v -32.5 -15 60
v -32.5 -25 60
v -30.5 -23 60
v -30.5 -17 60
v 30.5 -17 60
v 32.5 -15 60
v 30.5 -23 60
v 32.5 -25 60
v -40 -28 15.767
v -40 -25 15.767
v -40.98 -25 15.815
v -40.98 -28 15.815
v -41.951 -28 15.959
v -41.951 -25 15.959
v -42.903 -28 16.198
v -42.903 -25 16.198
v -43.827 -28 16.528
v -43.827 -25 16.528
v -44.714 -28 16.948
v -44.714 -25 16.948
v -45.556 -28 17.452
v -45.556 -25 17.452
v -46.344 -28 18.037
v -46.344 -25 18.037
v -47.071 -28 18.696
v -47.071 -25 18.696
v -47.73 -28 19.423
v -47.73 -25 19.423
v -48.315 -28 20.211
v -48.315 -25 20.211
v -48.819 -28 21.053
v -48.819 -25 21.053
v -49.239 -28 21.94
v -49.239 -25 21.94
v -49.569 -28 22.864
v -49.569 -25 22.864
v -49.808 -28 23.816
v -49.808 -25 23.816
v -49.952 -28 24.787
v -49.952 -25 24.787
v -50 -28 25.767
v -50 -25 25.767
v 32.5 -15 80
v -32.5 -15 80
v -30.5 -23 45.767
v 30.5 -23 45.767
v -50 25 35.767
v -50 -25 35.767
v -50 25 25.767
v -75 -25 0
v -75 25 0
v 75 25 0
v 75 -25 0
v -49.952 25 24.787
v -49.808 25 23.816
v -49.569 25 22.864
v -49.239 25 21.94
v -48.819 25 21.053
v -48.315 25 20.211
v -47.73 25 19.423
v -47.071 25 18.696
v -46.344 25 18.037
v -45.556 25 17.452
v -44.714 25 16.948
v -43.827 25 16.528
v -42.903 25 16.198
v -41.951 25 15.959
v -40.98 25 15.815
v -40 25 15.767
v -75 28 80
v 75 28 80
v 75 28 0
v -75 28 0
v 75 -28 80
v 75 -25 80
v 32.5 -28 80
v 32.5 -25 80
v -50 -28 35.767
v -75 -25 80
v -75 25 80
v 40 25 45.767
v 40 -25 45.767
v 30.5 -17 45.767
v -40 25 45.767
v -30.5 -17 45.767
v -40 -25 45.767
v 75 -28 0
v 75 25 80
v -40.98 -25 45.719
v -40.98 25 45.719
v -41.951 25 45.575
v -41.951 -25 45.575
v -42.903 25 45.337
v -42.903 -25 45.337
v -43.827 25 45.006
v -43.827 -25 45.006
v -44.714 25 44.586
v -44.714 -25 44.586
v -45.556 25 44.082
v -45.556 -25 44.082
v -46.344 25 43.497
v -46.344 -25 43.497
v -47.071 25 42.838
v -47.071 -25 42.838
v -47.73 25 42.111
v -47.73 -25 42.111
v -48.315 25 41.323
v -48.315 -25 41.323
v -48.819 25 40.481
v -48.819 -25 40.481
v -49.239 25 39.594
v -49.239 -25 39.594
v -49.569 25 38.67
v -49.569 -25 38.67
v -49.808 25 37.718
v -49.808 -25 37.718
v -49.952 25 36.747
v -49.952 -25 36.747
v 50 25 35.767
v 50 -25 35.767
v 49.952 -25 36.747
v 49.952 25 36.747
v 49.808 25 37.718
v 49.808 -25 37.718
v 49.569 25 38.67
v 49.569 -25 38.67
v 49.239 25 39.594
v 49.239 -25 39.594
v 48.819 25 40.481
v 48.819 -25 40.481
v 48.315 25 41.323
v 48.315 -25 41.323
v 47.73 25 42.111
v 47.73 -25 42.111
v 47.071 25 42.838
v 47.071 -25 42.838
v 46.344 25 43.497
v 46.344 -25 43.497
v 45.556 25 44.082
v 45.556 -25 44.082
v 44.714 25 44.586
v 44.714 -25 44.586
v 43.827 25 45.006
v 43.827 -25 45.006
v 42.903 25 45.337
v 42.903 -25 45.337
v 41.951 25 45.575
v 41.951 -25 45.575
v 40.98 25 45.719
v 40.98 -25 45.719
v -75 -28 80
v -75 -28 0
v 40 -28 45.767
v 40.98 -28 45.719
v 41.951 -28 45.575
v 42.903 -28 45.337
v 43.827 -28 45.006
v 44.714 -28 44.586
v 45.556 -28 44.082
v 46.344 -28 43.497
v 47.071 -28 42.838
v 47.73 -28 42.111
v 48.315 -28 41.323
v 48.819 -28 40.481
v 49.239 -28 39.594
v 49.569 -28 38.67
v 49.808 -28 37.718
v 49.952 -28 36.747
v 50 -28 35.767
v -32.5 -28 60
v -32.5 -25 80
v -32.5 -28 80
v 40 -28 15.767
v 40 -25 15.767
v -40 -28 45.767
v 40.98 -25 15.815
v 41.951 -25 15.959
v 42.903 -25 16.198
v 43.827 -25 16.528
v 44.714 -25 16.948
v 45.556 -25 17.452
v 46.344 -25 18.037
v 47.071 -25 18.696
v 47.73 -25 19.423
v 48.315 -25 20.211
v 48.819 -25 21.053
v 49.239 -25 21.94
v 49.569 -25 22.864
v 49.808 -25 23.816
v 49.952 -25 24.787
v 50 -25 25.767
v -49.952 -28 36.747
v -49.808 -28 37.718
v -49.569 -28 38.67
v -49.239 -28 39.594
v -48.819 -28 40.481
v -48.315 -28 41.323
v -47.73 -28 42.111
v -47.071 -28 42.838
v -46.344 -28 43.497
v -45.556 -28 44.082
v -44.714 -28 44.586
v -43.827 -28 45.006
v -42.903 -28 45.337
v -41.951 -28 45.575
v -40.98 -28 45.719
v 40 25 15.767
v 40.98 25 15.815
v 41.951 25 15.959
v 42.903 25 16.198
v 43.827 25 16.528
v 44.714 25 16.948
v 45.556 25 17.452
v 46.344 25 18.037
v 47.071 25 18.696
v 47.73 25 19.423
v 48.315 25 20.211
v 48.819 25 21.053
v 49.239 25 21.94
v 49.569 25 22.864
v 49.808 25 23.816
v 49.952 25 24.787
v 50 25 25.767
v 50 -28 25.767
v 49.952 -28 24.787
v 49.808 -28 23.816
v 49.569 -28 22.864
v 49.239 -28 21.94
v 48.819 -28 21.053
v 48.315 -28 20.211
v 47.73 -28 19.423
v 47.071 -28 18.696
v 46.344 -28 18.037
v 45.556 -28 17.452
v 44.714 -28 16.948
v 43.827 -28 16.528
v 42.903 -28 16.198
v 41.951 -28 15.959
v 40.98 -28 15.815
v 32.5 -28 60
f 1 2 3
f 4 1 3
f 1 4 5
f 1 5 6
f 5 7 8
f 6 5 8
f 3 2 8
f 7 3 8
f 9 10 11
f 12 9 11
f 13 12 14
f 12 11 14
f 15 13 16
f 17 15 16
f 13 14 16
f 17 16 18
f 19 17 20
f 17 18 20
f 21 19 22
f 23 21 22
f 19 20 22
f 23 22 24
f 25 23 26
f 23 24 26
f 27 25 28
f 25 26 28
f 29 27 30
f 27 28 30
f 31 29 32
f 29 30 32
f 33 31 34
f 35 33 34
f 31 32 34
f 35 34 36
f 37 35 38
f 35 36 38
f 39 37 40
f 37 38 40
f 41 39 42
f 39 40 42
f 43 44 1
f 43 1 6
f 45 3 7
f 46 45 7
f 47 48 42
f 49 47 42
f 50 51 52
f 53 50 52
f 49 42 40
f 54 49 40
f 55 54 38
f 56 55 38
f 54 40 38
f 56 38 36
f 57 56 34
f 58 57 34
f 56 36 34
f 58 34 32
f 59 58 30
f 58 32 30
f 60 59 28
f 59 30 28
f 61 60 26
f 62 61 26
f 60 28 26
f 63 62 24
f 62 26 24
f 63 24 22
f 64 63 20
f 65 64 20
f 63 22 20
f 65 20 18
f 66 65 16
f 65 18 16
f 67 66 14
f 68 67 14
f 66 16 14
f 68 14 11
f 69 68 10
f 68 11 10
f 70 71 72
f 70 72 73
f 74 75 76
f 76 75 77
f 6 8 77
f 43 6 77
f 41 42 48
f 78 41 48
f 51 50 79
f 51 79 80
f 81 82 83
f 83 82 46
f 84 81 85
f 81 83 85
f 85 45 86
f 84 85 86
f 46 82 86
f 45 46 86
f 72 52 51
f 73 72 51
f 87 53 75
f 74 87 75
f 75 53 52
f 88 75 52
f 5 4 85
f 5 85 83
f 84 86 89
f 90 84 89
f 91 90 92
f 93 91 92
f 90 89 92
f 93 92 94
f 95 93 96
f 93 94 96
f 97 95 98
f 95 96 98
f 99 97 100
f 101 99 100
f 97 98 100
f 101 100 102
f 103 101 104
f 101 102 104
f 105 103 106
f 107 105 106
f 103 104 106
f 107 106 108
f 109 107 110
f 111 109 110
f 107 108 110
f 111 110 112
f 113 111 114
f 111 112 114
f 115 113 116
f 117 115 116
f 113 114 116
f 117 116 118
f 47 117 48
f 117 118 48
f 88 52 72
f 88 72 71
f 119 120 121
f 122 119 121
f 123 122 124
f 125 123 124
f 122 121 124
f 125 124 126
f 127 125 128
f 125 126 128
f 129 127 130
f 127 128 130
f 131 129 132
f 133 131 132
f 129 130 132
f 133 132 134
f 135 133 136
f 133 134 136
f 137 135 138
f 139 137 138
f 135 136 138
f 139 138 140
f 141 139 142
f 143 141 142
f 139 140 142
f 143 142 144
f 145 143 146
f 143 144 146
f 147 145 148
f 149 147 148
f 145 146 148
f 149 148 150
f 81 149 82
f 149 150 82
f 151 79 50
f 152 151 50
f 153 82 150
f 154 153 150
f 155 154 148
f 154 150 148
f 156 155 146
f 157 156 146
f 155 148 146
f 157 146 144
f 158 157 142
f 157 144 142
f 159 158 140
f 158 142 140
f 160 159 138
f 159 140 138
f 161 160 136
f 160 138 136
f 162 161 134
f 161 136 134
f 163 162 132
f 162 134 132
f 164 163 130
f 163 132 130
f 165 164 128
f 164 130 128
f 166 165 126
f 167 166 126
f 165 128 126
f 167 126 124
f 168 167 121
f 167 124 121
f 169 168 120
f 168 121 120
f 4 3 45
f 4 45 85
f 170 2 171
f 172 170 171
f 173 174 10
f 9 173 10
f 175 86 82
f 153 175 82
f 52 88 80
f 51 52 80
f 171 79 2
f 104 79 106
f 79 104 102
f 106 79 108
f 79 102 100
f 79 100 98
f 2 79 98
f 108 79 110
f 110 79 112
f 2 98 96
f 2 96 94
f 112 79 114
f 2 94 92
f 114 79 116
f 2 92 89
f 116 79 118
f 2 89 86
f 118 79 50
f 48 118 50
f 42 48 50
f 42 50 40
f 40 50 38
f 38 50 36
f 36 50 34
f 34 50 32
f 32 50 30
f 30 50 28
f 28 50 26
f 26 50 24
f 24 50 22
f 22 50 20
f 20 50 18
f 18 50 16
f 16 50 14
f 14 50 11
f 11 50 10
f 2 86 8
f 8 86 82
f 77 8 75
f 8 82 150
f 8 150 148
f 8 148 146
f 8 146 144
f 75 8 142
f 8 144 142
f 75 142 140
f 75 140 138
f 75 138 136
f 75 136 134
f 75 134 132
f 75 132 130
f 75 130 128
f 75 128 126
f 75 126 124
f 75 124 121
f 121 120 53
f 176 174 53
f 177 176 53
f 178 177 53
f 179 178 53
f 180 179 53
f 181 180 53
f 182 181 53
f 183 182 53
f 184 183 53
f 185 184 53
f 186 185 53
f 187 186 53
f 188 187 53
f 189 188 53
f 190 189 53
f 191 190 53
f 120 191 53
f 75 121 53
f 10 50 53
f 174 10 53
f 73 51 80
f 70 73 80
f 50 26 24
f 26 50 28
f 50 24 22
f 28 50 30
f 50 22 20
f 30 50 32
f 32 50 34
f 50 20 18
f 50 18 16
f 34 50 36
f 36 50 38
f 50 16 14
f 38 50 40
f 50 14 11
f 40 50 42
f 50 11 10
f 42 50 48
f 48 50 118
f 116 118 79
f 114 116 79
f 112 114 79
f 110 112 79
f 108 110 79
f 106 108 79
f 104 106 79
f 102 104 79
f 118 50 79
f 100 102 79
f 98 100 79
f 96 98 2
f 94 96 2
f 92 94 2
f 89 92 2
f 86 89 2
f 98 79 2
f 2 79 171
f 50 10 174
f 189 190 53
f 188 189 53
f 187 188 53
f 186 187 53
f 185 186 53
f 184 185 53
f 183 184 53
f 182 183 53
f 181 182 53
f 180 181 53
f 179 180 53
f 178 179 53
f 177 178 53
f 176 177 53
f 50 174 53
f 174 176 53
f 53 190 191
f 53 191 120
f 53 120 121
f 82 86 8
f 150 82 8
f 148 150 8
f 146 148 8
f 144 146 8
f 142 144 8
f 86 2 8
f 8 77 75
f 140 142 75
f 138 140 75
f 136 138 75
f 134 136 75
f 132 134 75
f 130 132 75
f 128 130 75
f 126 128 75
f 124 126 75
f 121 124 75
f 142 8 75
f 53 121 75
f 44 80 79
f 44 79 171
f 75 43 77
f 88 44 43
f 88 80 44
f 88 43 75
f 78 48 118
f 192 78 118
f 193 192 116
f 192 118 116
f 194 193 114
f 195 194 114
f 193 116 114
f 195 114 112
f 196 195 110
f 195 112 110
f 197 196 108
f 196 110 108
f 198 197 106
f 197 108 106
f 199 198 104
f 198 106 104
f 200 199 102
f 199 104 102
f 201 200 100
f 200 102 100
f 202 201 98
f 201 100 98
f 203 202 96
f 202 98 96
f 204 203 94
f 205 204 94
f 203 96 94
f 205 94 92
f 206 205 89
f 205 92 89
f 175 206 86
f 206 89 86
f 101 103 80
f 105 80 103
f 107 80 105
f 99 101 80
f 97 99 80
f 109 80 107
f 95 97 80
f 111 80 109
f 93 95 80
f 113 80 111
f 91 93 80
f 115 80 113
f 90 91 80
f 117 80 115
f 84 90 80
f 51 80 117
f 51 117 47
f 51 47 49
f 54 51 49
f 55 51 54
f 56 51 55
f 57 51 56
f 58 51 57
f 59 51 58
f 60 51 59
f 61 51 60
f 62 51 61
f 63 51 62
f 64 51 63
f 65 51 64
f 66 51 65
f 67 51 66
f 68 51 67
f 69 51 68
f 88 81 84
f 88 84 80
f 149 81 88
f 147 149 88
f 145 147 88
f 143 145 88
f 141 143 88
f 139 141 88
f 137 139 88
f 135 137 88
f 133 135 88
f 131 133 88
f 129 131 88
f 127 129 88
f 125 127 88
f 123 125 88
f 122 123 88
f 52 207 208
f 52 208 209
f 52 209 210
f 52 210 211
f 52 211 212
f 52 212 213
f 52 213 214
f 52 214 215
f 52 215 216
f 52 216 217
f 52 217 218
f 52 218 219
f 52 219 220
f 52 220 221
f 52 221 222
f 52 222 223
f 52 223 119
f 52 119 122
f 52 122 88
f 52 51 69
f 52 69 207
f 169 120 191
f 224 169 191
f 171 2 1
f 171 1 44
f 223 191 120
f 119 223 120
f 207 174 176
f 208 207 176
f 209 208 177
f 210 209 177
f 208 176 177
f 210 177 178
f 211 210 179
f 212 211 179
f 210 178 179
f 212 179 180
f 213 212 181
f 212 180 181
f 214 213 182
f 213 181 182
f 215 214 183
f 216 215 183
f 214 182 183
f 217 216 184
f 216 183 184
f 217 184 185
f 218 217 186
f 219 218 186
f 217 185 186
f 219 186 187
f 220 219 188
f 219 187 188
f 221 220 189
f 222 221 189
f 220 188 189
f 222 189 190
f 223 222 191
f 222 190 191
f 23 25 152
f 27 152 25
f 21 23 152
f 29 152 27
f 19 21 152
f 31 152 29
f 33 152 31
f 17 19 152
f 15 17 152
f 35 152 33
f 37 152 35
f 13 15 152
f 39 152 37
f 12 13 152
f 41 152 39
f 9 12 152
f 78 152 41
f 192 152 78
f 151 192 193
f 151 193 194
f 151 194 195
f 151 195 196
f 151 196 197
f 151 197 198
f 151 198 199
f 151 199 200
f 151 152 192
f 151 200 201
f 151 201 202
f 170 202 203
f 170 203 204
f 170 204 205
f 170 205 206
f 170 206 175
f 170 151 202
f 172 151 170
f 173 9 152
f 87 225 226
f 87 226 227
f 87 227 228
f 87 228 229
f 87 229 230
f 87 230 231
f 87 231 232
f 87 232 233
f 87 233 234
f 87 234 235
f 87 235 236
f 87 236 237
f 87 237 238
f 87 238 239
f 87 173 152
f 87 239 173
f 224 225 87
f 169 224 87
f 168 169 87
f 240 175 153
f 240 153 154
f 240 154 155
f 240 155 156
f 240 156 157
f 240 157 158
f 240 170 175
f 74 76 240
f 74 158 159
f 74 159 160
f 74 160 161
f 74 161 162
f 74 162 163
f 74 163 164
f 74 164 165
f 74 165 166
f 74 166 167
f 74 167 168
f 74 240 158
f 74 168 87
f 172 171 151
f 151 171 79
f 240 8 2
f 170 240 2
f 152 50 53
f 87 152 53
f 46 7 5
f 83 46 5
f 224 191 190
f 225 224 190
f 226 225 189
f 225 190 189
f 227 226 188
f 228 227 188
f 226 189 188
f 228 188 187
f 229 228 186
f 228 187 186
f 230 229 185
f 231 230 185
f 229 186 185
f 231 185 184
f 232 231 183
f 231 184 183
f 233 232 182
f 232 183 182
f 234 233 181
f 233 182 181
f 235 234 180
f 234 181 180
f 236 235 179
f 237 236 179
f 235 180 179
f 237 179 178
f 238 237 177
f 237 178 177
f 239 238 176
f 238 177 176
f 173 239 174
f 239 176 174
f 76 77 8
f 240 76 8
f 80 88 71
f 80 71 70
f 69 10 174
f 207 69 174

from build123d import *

# Parameters (mm, degrees)
F0_W      = 150
F0_H      = 50
F1_DEPTH  = 80
F2_W      = 65
F2_H      = 20
F3_DEPTH  = 10
F5_DEPTH  = 67.4
F6_W      = 61
F6_H      = 6
F7_DEPTH  = 25
F9_DEPTH  = 3
F10_W     = 150
F10_H     = 80
F11_DEPTH = 3


with BuildPart() as f1:
    # F0 (on Top) → F1 (new body)
    with BuildSketch(Plane.XY):
        Rectangle(F0_W, F0_H)
    extrude(amount=F1_DEPTH)

    # F2 (on face) → F3 (cut)
    with BuildSketch(Plane.XZ.offset(25)):
        with Locations((0, 70)):
            Rectangle(F2_W, F2_H)
    extrude(amount=-F3_DEPTH, mode=Mode.SUBTRACT)

    # F4 (on face) → F5 (cut)
    with BuildSketch(Plane.XZ.offset(25)):
        with BuildLine():
            Line((40, 45.7671124575), (-40, 45.7671124575))
            ThreePointArc((-40, 45.7671124575), (-47.0710678119, 42.8381802693), (-50, 35.7671124575))
            Line((-50, 35.7671124575), (-50, 25.7671124575))
            ThreePointArc((-50, 25.7671124575), (-47.0710678119, 18.6960446456), (-40, 15.7671124575))
            Line((-40, 15.7671124575), (40, 15.7671124575))
            ThreePointArc((40, 15.7671124575), (47.0710678119, 18.6960446456), (50, 25.7671124575))
            Line((50, 25.7671124575), (50, 35.7671124575))
            ThreePointArc((50, 35.7671124575), (47.0710678119, 42.8381802693), (40, 45.7671124575))
        make_face()
    extrude(amount=-F5_DEPTH, mode=Mode.SUBTRACT)

    # F6 (on face) → F7 (cut)
    with BuildSketch(Plane.XY.offset(60)):
        with Locations((0, -20)):
            Rectangle(F6_W, F6_H)
    extrude(amount=-F7_DEPTH, mode=Mode.SUBTRACT)


with BuildPart() as f9:
    # F8 (on face) → F9 (new body)
    with BuildSketch(Plane.XZ.offset(25)):
        Polygon((-32.5, 80), (-75, 80), (-75, 0), (75, 0), (75, 80), (32.5, 80), (32.5, 60), (-32.5, 60), align=None)
        with BuildLine():
            ThreePointArc((-50, 35.7671124575), (-47.0710678119, 42.8381802693), (-40, 45.7671124575))
            Line((-40, 45.7671124575), (40, 45.7671124575))
            ThreePointArc((40, 45.7671124575), (47.0710678119, 42.8381802693), (50, 35.7671124575))
            Line((50, 35.7671124575), (50, 25.7671124575))
            ThreePointArc((50, 25.7671124575), (47.0710678119, 18.6960446456), (40, 15.7671124575))
            Line((40, 15.7671124575), (-40, 15.7671124575))
            ThreePointArc((-40, 15.7671124575), (-47.0710678119, 18.6960446456), (-50, 25.7671124575))
            Line((-50, 25.7671124575), (-50, 35.7671124575))
        make_face(mode=Mode.SUBTRACT)
    extrude(amount=F9_DEPTH)


with BuildPart() as f11:
    # F10 (on face) → F11 (new body)
    with BuildSketch(Plane(origin=(0, 25, 0), x_dir=(-1, 0, 0), z_dir=(0, 1, 0))):
        with Locations((0, 40)):
            Rectangle(F10_W, F10_H)
    extrude(amount=F11_DEPTH)


solid = Compound([f1.part, f9.part, f11.part])
